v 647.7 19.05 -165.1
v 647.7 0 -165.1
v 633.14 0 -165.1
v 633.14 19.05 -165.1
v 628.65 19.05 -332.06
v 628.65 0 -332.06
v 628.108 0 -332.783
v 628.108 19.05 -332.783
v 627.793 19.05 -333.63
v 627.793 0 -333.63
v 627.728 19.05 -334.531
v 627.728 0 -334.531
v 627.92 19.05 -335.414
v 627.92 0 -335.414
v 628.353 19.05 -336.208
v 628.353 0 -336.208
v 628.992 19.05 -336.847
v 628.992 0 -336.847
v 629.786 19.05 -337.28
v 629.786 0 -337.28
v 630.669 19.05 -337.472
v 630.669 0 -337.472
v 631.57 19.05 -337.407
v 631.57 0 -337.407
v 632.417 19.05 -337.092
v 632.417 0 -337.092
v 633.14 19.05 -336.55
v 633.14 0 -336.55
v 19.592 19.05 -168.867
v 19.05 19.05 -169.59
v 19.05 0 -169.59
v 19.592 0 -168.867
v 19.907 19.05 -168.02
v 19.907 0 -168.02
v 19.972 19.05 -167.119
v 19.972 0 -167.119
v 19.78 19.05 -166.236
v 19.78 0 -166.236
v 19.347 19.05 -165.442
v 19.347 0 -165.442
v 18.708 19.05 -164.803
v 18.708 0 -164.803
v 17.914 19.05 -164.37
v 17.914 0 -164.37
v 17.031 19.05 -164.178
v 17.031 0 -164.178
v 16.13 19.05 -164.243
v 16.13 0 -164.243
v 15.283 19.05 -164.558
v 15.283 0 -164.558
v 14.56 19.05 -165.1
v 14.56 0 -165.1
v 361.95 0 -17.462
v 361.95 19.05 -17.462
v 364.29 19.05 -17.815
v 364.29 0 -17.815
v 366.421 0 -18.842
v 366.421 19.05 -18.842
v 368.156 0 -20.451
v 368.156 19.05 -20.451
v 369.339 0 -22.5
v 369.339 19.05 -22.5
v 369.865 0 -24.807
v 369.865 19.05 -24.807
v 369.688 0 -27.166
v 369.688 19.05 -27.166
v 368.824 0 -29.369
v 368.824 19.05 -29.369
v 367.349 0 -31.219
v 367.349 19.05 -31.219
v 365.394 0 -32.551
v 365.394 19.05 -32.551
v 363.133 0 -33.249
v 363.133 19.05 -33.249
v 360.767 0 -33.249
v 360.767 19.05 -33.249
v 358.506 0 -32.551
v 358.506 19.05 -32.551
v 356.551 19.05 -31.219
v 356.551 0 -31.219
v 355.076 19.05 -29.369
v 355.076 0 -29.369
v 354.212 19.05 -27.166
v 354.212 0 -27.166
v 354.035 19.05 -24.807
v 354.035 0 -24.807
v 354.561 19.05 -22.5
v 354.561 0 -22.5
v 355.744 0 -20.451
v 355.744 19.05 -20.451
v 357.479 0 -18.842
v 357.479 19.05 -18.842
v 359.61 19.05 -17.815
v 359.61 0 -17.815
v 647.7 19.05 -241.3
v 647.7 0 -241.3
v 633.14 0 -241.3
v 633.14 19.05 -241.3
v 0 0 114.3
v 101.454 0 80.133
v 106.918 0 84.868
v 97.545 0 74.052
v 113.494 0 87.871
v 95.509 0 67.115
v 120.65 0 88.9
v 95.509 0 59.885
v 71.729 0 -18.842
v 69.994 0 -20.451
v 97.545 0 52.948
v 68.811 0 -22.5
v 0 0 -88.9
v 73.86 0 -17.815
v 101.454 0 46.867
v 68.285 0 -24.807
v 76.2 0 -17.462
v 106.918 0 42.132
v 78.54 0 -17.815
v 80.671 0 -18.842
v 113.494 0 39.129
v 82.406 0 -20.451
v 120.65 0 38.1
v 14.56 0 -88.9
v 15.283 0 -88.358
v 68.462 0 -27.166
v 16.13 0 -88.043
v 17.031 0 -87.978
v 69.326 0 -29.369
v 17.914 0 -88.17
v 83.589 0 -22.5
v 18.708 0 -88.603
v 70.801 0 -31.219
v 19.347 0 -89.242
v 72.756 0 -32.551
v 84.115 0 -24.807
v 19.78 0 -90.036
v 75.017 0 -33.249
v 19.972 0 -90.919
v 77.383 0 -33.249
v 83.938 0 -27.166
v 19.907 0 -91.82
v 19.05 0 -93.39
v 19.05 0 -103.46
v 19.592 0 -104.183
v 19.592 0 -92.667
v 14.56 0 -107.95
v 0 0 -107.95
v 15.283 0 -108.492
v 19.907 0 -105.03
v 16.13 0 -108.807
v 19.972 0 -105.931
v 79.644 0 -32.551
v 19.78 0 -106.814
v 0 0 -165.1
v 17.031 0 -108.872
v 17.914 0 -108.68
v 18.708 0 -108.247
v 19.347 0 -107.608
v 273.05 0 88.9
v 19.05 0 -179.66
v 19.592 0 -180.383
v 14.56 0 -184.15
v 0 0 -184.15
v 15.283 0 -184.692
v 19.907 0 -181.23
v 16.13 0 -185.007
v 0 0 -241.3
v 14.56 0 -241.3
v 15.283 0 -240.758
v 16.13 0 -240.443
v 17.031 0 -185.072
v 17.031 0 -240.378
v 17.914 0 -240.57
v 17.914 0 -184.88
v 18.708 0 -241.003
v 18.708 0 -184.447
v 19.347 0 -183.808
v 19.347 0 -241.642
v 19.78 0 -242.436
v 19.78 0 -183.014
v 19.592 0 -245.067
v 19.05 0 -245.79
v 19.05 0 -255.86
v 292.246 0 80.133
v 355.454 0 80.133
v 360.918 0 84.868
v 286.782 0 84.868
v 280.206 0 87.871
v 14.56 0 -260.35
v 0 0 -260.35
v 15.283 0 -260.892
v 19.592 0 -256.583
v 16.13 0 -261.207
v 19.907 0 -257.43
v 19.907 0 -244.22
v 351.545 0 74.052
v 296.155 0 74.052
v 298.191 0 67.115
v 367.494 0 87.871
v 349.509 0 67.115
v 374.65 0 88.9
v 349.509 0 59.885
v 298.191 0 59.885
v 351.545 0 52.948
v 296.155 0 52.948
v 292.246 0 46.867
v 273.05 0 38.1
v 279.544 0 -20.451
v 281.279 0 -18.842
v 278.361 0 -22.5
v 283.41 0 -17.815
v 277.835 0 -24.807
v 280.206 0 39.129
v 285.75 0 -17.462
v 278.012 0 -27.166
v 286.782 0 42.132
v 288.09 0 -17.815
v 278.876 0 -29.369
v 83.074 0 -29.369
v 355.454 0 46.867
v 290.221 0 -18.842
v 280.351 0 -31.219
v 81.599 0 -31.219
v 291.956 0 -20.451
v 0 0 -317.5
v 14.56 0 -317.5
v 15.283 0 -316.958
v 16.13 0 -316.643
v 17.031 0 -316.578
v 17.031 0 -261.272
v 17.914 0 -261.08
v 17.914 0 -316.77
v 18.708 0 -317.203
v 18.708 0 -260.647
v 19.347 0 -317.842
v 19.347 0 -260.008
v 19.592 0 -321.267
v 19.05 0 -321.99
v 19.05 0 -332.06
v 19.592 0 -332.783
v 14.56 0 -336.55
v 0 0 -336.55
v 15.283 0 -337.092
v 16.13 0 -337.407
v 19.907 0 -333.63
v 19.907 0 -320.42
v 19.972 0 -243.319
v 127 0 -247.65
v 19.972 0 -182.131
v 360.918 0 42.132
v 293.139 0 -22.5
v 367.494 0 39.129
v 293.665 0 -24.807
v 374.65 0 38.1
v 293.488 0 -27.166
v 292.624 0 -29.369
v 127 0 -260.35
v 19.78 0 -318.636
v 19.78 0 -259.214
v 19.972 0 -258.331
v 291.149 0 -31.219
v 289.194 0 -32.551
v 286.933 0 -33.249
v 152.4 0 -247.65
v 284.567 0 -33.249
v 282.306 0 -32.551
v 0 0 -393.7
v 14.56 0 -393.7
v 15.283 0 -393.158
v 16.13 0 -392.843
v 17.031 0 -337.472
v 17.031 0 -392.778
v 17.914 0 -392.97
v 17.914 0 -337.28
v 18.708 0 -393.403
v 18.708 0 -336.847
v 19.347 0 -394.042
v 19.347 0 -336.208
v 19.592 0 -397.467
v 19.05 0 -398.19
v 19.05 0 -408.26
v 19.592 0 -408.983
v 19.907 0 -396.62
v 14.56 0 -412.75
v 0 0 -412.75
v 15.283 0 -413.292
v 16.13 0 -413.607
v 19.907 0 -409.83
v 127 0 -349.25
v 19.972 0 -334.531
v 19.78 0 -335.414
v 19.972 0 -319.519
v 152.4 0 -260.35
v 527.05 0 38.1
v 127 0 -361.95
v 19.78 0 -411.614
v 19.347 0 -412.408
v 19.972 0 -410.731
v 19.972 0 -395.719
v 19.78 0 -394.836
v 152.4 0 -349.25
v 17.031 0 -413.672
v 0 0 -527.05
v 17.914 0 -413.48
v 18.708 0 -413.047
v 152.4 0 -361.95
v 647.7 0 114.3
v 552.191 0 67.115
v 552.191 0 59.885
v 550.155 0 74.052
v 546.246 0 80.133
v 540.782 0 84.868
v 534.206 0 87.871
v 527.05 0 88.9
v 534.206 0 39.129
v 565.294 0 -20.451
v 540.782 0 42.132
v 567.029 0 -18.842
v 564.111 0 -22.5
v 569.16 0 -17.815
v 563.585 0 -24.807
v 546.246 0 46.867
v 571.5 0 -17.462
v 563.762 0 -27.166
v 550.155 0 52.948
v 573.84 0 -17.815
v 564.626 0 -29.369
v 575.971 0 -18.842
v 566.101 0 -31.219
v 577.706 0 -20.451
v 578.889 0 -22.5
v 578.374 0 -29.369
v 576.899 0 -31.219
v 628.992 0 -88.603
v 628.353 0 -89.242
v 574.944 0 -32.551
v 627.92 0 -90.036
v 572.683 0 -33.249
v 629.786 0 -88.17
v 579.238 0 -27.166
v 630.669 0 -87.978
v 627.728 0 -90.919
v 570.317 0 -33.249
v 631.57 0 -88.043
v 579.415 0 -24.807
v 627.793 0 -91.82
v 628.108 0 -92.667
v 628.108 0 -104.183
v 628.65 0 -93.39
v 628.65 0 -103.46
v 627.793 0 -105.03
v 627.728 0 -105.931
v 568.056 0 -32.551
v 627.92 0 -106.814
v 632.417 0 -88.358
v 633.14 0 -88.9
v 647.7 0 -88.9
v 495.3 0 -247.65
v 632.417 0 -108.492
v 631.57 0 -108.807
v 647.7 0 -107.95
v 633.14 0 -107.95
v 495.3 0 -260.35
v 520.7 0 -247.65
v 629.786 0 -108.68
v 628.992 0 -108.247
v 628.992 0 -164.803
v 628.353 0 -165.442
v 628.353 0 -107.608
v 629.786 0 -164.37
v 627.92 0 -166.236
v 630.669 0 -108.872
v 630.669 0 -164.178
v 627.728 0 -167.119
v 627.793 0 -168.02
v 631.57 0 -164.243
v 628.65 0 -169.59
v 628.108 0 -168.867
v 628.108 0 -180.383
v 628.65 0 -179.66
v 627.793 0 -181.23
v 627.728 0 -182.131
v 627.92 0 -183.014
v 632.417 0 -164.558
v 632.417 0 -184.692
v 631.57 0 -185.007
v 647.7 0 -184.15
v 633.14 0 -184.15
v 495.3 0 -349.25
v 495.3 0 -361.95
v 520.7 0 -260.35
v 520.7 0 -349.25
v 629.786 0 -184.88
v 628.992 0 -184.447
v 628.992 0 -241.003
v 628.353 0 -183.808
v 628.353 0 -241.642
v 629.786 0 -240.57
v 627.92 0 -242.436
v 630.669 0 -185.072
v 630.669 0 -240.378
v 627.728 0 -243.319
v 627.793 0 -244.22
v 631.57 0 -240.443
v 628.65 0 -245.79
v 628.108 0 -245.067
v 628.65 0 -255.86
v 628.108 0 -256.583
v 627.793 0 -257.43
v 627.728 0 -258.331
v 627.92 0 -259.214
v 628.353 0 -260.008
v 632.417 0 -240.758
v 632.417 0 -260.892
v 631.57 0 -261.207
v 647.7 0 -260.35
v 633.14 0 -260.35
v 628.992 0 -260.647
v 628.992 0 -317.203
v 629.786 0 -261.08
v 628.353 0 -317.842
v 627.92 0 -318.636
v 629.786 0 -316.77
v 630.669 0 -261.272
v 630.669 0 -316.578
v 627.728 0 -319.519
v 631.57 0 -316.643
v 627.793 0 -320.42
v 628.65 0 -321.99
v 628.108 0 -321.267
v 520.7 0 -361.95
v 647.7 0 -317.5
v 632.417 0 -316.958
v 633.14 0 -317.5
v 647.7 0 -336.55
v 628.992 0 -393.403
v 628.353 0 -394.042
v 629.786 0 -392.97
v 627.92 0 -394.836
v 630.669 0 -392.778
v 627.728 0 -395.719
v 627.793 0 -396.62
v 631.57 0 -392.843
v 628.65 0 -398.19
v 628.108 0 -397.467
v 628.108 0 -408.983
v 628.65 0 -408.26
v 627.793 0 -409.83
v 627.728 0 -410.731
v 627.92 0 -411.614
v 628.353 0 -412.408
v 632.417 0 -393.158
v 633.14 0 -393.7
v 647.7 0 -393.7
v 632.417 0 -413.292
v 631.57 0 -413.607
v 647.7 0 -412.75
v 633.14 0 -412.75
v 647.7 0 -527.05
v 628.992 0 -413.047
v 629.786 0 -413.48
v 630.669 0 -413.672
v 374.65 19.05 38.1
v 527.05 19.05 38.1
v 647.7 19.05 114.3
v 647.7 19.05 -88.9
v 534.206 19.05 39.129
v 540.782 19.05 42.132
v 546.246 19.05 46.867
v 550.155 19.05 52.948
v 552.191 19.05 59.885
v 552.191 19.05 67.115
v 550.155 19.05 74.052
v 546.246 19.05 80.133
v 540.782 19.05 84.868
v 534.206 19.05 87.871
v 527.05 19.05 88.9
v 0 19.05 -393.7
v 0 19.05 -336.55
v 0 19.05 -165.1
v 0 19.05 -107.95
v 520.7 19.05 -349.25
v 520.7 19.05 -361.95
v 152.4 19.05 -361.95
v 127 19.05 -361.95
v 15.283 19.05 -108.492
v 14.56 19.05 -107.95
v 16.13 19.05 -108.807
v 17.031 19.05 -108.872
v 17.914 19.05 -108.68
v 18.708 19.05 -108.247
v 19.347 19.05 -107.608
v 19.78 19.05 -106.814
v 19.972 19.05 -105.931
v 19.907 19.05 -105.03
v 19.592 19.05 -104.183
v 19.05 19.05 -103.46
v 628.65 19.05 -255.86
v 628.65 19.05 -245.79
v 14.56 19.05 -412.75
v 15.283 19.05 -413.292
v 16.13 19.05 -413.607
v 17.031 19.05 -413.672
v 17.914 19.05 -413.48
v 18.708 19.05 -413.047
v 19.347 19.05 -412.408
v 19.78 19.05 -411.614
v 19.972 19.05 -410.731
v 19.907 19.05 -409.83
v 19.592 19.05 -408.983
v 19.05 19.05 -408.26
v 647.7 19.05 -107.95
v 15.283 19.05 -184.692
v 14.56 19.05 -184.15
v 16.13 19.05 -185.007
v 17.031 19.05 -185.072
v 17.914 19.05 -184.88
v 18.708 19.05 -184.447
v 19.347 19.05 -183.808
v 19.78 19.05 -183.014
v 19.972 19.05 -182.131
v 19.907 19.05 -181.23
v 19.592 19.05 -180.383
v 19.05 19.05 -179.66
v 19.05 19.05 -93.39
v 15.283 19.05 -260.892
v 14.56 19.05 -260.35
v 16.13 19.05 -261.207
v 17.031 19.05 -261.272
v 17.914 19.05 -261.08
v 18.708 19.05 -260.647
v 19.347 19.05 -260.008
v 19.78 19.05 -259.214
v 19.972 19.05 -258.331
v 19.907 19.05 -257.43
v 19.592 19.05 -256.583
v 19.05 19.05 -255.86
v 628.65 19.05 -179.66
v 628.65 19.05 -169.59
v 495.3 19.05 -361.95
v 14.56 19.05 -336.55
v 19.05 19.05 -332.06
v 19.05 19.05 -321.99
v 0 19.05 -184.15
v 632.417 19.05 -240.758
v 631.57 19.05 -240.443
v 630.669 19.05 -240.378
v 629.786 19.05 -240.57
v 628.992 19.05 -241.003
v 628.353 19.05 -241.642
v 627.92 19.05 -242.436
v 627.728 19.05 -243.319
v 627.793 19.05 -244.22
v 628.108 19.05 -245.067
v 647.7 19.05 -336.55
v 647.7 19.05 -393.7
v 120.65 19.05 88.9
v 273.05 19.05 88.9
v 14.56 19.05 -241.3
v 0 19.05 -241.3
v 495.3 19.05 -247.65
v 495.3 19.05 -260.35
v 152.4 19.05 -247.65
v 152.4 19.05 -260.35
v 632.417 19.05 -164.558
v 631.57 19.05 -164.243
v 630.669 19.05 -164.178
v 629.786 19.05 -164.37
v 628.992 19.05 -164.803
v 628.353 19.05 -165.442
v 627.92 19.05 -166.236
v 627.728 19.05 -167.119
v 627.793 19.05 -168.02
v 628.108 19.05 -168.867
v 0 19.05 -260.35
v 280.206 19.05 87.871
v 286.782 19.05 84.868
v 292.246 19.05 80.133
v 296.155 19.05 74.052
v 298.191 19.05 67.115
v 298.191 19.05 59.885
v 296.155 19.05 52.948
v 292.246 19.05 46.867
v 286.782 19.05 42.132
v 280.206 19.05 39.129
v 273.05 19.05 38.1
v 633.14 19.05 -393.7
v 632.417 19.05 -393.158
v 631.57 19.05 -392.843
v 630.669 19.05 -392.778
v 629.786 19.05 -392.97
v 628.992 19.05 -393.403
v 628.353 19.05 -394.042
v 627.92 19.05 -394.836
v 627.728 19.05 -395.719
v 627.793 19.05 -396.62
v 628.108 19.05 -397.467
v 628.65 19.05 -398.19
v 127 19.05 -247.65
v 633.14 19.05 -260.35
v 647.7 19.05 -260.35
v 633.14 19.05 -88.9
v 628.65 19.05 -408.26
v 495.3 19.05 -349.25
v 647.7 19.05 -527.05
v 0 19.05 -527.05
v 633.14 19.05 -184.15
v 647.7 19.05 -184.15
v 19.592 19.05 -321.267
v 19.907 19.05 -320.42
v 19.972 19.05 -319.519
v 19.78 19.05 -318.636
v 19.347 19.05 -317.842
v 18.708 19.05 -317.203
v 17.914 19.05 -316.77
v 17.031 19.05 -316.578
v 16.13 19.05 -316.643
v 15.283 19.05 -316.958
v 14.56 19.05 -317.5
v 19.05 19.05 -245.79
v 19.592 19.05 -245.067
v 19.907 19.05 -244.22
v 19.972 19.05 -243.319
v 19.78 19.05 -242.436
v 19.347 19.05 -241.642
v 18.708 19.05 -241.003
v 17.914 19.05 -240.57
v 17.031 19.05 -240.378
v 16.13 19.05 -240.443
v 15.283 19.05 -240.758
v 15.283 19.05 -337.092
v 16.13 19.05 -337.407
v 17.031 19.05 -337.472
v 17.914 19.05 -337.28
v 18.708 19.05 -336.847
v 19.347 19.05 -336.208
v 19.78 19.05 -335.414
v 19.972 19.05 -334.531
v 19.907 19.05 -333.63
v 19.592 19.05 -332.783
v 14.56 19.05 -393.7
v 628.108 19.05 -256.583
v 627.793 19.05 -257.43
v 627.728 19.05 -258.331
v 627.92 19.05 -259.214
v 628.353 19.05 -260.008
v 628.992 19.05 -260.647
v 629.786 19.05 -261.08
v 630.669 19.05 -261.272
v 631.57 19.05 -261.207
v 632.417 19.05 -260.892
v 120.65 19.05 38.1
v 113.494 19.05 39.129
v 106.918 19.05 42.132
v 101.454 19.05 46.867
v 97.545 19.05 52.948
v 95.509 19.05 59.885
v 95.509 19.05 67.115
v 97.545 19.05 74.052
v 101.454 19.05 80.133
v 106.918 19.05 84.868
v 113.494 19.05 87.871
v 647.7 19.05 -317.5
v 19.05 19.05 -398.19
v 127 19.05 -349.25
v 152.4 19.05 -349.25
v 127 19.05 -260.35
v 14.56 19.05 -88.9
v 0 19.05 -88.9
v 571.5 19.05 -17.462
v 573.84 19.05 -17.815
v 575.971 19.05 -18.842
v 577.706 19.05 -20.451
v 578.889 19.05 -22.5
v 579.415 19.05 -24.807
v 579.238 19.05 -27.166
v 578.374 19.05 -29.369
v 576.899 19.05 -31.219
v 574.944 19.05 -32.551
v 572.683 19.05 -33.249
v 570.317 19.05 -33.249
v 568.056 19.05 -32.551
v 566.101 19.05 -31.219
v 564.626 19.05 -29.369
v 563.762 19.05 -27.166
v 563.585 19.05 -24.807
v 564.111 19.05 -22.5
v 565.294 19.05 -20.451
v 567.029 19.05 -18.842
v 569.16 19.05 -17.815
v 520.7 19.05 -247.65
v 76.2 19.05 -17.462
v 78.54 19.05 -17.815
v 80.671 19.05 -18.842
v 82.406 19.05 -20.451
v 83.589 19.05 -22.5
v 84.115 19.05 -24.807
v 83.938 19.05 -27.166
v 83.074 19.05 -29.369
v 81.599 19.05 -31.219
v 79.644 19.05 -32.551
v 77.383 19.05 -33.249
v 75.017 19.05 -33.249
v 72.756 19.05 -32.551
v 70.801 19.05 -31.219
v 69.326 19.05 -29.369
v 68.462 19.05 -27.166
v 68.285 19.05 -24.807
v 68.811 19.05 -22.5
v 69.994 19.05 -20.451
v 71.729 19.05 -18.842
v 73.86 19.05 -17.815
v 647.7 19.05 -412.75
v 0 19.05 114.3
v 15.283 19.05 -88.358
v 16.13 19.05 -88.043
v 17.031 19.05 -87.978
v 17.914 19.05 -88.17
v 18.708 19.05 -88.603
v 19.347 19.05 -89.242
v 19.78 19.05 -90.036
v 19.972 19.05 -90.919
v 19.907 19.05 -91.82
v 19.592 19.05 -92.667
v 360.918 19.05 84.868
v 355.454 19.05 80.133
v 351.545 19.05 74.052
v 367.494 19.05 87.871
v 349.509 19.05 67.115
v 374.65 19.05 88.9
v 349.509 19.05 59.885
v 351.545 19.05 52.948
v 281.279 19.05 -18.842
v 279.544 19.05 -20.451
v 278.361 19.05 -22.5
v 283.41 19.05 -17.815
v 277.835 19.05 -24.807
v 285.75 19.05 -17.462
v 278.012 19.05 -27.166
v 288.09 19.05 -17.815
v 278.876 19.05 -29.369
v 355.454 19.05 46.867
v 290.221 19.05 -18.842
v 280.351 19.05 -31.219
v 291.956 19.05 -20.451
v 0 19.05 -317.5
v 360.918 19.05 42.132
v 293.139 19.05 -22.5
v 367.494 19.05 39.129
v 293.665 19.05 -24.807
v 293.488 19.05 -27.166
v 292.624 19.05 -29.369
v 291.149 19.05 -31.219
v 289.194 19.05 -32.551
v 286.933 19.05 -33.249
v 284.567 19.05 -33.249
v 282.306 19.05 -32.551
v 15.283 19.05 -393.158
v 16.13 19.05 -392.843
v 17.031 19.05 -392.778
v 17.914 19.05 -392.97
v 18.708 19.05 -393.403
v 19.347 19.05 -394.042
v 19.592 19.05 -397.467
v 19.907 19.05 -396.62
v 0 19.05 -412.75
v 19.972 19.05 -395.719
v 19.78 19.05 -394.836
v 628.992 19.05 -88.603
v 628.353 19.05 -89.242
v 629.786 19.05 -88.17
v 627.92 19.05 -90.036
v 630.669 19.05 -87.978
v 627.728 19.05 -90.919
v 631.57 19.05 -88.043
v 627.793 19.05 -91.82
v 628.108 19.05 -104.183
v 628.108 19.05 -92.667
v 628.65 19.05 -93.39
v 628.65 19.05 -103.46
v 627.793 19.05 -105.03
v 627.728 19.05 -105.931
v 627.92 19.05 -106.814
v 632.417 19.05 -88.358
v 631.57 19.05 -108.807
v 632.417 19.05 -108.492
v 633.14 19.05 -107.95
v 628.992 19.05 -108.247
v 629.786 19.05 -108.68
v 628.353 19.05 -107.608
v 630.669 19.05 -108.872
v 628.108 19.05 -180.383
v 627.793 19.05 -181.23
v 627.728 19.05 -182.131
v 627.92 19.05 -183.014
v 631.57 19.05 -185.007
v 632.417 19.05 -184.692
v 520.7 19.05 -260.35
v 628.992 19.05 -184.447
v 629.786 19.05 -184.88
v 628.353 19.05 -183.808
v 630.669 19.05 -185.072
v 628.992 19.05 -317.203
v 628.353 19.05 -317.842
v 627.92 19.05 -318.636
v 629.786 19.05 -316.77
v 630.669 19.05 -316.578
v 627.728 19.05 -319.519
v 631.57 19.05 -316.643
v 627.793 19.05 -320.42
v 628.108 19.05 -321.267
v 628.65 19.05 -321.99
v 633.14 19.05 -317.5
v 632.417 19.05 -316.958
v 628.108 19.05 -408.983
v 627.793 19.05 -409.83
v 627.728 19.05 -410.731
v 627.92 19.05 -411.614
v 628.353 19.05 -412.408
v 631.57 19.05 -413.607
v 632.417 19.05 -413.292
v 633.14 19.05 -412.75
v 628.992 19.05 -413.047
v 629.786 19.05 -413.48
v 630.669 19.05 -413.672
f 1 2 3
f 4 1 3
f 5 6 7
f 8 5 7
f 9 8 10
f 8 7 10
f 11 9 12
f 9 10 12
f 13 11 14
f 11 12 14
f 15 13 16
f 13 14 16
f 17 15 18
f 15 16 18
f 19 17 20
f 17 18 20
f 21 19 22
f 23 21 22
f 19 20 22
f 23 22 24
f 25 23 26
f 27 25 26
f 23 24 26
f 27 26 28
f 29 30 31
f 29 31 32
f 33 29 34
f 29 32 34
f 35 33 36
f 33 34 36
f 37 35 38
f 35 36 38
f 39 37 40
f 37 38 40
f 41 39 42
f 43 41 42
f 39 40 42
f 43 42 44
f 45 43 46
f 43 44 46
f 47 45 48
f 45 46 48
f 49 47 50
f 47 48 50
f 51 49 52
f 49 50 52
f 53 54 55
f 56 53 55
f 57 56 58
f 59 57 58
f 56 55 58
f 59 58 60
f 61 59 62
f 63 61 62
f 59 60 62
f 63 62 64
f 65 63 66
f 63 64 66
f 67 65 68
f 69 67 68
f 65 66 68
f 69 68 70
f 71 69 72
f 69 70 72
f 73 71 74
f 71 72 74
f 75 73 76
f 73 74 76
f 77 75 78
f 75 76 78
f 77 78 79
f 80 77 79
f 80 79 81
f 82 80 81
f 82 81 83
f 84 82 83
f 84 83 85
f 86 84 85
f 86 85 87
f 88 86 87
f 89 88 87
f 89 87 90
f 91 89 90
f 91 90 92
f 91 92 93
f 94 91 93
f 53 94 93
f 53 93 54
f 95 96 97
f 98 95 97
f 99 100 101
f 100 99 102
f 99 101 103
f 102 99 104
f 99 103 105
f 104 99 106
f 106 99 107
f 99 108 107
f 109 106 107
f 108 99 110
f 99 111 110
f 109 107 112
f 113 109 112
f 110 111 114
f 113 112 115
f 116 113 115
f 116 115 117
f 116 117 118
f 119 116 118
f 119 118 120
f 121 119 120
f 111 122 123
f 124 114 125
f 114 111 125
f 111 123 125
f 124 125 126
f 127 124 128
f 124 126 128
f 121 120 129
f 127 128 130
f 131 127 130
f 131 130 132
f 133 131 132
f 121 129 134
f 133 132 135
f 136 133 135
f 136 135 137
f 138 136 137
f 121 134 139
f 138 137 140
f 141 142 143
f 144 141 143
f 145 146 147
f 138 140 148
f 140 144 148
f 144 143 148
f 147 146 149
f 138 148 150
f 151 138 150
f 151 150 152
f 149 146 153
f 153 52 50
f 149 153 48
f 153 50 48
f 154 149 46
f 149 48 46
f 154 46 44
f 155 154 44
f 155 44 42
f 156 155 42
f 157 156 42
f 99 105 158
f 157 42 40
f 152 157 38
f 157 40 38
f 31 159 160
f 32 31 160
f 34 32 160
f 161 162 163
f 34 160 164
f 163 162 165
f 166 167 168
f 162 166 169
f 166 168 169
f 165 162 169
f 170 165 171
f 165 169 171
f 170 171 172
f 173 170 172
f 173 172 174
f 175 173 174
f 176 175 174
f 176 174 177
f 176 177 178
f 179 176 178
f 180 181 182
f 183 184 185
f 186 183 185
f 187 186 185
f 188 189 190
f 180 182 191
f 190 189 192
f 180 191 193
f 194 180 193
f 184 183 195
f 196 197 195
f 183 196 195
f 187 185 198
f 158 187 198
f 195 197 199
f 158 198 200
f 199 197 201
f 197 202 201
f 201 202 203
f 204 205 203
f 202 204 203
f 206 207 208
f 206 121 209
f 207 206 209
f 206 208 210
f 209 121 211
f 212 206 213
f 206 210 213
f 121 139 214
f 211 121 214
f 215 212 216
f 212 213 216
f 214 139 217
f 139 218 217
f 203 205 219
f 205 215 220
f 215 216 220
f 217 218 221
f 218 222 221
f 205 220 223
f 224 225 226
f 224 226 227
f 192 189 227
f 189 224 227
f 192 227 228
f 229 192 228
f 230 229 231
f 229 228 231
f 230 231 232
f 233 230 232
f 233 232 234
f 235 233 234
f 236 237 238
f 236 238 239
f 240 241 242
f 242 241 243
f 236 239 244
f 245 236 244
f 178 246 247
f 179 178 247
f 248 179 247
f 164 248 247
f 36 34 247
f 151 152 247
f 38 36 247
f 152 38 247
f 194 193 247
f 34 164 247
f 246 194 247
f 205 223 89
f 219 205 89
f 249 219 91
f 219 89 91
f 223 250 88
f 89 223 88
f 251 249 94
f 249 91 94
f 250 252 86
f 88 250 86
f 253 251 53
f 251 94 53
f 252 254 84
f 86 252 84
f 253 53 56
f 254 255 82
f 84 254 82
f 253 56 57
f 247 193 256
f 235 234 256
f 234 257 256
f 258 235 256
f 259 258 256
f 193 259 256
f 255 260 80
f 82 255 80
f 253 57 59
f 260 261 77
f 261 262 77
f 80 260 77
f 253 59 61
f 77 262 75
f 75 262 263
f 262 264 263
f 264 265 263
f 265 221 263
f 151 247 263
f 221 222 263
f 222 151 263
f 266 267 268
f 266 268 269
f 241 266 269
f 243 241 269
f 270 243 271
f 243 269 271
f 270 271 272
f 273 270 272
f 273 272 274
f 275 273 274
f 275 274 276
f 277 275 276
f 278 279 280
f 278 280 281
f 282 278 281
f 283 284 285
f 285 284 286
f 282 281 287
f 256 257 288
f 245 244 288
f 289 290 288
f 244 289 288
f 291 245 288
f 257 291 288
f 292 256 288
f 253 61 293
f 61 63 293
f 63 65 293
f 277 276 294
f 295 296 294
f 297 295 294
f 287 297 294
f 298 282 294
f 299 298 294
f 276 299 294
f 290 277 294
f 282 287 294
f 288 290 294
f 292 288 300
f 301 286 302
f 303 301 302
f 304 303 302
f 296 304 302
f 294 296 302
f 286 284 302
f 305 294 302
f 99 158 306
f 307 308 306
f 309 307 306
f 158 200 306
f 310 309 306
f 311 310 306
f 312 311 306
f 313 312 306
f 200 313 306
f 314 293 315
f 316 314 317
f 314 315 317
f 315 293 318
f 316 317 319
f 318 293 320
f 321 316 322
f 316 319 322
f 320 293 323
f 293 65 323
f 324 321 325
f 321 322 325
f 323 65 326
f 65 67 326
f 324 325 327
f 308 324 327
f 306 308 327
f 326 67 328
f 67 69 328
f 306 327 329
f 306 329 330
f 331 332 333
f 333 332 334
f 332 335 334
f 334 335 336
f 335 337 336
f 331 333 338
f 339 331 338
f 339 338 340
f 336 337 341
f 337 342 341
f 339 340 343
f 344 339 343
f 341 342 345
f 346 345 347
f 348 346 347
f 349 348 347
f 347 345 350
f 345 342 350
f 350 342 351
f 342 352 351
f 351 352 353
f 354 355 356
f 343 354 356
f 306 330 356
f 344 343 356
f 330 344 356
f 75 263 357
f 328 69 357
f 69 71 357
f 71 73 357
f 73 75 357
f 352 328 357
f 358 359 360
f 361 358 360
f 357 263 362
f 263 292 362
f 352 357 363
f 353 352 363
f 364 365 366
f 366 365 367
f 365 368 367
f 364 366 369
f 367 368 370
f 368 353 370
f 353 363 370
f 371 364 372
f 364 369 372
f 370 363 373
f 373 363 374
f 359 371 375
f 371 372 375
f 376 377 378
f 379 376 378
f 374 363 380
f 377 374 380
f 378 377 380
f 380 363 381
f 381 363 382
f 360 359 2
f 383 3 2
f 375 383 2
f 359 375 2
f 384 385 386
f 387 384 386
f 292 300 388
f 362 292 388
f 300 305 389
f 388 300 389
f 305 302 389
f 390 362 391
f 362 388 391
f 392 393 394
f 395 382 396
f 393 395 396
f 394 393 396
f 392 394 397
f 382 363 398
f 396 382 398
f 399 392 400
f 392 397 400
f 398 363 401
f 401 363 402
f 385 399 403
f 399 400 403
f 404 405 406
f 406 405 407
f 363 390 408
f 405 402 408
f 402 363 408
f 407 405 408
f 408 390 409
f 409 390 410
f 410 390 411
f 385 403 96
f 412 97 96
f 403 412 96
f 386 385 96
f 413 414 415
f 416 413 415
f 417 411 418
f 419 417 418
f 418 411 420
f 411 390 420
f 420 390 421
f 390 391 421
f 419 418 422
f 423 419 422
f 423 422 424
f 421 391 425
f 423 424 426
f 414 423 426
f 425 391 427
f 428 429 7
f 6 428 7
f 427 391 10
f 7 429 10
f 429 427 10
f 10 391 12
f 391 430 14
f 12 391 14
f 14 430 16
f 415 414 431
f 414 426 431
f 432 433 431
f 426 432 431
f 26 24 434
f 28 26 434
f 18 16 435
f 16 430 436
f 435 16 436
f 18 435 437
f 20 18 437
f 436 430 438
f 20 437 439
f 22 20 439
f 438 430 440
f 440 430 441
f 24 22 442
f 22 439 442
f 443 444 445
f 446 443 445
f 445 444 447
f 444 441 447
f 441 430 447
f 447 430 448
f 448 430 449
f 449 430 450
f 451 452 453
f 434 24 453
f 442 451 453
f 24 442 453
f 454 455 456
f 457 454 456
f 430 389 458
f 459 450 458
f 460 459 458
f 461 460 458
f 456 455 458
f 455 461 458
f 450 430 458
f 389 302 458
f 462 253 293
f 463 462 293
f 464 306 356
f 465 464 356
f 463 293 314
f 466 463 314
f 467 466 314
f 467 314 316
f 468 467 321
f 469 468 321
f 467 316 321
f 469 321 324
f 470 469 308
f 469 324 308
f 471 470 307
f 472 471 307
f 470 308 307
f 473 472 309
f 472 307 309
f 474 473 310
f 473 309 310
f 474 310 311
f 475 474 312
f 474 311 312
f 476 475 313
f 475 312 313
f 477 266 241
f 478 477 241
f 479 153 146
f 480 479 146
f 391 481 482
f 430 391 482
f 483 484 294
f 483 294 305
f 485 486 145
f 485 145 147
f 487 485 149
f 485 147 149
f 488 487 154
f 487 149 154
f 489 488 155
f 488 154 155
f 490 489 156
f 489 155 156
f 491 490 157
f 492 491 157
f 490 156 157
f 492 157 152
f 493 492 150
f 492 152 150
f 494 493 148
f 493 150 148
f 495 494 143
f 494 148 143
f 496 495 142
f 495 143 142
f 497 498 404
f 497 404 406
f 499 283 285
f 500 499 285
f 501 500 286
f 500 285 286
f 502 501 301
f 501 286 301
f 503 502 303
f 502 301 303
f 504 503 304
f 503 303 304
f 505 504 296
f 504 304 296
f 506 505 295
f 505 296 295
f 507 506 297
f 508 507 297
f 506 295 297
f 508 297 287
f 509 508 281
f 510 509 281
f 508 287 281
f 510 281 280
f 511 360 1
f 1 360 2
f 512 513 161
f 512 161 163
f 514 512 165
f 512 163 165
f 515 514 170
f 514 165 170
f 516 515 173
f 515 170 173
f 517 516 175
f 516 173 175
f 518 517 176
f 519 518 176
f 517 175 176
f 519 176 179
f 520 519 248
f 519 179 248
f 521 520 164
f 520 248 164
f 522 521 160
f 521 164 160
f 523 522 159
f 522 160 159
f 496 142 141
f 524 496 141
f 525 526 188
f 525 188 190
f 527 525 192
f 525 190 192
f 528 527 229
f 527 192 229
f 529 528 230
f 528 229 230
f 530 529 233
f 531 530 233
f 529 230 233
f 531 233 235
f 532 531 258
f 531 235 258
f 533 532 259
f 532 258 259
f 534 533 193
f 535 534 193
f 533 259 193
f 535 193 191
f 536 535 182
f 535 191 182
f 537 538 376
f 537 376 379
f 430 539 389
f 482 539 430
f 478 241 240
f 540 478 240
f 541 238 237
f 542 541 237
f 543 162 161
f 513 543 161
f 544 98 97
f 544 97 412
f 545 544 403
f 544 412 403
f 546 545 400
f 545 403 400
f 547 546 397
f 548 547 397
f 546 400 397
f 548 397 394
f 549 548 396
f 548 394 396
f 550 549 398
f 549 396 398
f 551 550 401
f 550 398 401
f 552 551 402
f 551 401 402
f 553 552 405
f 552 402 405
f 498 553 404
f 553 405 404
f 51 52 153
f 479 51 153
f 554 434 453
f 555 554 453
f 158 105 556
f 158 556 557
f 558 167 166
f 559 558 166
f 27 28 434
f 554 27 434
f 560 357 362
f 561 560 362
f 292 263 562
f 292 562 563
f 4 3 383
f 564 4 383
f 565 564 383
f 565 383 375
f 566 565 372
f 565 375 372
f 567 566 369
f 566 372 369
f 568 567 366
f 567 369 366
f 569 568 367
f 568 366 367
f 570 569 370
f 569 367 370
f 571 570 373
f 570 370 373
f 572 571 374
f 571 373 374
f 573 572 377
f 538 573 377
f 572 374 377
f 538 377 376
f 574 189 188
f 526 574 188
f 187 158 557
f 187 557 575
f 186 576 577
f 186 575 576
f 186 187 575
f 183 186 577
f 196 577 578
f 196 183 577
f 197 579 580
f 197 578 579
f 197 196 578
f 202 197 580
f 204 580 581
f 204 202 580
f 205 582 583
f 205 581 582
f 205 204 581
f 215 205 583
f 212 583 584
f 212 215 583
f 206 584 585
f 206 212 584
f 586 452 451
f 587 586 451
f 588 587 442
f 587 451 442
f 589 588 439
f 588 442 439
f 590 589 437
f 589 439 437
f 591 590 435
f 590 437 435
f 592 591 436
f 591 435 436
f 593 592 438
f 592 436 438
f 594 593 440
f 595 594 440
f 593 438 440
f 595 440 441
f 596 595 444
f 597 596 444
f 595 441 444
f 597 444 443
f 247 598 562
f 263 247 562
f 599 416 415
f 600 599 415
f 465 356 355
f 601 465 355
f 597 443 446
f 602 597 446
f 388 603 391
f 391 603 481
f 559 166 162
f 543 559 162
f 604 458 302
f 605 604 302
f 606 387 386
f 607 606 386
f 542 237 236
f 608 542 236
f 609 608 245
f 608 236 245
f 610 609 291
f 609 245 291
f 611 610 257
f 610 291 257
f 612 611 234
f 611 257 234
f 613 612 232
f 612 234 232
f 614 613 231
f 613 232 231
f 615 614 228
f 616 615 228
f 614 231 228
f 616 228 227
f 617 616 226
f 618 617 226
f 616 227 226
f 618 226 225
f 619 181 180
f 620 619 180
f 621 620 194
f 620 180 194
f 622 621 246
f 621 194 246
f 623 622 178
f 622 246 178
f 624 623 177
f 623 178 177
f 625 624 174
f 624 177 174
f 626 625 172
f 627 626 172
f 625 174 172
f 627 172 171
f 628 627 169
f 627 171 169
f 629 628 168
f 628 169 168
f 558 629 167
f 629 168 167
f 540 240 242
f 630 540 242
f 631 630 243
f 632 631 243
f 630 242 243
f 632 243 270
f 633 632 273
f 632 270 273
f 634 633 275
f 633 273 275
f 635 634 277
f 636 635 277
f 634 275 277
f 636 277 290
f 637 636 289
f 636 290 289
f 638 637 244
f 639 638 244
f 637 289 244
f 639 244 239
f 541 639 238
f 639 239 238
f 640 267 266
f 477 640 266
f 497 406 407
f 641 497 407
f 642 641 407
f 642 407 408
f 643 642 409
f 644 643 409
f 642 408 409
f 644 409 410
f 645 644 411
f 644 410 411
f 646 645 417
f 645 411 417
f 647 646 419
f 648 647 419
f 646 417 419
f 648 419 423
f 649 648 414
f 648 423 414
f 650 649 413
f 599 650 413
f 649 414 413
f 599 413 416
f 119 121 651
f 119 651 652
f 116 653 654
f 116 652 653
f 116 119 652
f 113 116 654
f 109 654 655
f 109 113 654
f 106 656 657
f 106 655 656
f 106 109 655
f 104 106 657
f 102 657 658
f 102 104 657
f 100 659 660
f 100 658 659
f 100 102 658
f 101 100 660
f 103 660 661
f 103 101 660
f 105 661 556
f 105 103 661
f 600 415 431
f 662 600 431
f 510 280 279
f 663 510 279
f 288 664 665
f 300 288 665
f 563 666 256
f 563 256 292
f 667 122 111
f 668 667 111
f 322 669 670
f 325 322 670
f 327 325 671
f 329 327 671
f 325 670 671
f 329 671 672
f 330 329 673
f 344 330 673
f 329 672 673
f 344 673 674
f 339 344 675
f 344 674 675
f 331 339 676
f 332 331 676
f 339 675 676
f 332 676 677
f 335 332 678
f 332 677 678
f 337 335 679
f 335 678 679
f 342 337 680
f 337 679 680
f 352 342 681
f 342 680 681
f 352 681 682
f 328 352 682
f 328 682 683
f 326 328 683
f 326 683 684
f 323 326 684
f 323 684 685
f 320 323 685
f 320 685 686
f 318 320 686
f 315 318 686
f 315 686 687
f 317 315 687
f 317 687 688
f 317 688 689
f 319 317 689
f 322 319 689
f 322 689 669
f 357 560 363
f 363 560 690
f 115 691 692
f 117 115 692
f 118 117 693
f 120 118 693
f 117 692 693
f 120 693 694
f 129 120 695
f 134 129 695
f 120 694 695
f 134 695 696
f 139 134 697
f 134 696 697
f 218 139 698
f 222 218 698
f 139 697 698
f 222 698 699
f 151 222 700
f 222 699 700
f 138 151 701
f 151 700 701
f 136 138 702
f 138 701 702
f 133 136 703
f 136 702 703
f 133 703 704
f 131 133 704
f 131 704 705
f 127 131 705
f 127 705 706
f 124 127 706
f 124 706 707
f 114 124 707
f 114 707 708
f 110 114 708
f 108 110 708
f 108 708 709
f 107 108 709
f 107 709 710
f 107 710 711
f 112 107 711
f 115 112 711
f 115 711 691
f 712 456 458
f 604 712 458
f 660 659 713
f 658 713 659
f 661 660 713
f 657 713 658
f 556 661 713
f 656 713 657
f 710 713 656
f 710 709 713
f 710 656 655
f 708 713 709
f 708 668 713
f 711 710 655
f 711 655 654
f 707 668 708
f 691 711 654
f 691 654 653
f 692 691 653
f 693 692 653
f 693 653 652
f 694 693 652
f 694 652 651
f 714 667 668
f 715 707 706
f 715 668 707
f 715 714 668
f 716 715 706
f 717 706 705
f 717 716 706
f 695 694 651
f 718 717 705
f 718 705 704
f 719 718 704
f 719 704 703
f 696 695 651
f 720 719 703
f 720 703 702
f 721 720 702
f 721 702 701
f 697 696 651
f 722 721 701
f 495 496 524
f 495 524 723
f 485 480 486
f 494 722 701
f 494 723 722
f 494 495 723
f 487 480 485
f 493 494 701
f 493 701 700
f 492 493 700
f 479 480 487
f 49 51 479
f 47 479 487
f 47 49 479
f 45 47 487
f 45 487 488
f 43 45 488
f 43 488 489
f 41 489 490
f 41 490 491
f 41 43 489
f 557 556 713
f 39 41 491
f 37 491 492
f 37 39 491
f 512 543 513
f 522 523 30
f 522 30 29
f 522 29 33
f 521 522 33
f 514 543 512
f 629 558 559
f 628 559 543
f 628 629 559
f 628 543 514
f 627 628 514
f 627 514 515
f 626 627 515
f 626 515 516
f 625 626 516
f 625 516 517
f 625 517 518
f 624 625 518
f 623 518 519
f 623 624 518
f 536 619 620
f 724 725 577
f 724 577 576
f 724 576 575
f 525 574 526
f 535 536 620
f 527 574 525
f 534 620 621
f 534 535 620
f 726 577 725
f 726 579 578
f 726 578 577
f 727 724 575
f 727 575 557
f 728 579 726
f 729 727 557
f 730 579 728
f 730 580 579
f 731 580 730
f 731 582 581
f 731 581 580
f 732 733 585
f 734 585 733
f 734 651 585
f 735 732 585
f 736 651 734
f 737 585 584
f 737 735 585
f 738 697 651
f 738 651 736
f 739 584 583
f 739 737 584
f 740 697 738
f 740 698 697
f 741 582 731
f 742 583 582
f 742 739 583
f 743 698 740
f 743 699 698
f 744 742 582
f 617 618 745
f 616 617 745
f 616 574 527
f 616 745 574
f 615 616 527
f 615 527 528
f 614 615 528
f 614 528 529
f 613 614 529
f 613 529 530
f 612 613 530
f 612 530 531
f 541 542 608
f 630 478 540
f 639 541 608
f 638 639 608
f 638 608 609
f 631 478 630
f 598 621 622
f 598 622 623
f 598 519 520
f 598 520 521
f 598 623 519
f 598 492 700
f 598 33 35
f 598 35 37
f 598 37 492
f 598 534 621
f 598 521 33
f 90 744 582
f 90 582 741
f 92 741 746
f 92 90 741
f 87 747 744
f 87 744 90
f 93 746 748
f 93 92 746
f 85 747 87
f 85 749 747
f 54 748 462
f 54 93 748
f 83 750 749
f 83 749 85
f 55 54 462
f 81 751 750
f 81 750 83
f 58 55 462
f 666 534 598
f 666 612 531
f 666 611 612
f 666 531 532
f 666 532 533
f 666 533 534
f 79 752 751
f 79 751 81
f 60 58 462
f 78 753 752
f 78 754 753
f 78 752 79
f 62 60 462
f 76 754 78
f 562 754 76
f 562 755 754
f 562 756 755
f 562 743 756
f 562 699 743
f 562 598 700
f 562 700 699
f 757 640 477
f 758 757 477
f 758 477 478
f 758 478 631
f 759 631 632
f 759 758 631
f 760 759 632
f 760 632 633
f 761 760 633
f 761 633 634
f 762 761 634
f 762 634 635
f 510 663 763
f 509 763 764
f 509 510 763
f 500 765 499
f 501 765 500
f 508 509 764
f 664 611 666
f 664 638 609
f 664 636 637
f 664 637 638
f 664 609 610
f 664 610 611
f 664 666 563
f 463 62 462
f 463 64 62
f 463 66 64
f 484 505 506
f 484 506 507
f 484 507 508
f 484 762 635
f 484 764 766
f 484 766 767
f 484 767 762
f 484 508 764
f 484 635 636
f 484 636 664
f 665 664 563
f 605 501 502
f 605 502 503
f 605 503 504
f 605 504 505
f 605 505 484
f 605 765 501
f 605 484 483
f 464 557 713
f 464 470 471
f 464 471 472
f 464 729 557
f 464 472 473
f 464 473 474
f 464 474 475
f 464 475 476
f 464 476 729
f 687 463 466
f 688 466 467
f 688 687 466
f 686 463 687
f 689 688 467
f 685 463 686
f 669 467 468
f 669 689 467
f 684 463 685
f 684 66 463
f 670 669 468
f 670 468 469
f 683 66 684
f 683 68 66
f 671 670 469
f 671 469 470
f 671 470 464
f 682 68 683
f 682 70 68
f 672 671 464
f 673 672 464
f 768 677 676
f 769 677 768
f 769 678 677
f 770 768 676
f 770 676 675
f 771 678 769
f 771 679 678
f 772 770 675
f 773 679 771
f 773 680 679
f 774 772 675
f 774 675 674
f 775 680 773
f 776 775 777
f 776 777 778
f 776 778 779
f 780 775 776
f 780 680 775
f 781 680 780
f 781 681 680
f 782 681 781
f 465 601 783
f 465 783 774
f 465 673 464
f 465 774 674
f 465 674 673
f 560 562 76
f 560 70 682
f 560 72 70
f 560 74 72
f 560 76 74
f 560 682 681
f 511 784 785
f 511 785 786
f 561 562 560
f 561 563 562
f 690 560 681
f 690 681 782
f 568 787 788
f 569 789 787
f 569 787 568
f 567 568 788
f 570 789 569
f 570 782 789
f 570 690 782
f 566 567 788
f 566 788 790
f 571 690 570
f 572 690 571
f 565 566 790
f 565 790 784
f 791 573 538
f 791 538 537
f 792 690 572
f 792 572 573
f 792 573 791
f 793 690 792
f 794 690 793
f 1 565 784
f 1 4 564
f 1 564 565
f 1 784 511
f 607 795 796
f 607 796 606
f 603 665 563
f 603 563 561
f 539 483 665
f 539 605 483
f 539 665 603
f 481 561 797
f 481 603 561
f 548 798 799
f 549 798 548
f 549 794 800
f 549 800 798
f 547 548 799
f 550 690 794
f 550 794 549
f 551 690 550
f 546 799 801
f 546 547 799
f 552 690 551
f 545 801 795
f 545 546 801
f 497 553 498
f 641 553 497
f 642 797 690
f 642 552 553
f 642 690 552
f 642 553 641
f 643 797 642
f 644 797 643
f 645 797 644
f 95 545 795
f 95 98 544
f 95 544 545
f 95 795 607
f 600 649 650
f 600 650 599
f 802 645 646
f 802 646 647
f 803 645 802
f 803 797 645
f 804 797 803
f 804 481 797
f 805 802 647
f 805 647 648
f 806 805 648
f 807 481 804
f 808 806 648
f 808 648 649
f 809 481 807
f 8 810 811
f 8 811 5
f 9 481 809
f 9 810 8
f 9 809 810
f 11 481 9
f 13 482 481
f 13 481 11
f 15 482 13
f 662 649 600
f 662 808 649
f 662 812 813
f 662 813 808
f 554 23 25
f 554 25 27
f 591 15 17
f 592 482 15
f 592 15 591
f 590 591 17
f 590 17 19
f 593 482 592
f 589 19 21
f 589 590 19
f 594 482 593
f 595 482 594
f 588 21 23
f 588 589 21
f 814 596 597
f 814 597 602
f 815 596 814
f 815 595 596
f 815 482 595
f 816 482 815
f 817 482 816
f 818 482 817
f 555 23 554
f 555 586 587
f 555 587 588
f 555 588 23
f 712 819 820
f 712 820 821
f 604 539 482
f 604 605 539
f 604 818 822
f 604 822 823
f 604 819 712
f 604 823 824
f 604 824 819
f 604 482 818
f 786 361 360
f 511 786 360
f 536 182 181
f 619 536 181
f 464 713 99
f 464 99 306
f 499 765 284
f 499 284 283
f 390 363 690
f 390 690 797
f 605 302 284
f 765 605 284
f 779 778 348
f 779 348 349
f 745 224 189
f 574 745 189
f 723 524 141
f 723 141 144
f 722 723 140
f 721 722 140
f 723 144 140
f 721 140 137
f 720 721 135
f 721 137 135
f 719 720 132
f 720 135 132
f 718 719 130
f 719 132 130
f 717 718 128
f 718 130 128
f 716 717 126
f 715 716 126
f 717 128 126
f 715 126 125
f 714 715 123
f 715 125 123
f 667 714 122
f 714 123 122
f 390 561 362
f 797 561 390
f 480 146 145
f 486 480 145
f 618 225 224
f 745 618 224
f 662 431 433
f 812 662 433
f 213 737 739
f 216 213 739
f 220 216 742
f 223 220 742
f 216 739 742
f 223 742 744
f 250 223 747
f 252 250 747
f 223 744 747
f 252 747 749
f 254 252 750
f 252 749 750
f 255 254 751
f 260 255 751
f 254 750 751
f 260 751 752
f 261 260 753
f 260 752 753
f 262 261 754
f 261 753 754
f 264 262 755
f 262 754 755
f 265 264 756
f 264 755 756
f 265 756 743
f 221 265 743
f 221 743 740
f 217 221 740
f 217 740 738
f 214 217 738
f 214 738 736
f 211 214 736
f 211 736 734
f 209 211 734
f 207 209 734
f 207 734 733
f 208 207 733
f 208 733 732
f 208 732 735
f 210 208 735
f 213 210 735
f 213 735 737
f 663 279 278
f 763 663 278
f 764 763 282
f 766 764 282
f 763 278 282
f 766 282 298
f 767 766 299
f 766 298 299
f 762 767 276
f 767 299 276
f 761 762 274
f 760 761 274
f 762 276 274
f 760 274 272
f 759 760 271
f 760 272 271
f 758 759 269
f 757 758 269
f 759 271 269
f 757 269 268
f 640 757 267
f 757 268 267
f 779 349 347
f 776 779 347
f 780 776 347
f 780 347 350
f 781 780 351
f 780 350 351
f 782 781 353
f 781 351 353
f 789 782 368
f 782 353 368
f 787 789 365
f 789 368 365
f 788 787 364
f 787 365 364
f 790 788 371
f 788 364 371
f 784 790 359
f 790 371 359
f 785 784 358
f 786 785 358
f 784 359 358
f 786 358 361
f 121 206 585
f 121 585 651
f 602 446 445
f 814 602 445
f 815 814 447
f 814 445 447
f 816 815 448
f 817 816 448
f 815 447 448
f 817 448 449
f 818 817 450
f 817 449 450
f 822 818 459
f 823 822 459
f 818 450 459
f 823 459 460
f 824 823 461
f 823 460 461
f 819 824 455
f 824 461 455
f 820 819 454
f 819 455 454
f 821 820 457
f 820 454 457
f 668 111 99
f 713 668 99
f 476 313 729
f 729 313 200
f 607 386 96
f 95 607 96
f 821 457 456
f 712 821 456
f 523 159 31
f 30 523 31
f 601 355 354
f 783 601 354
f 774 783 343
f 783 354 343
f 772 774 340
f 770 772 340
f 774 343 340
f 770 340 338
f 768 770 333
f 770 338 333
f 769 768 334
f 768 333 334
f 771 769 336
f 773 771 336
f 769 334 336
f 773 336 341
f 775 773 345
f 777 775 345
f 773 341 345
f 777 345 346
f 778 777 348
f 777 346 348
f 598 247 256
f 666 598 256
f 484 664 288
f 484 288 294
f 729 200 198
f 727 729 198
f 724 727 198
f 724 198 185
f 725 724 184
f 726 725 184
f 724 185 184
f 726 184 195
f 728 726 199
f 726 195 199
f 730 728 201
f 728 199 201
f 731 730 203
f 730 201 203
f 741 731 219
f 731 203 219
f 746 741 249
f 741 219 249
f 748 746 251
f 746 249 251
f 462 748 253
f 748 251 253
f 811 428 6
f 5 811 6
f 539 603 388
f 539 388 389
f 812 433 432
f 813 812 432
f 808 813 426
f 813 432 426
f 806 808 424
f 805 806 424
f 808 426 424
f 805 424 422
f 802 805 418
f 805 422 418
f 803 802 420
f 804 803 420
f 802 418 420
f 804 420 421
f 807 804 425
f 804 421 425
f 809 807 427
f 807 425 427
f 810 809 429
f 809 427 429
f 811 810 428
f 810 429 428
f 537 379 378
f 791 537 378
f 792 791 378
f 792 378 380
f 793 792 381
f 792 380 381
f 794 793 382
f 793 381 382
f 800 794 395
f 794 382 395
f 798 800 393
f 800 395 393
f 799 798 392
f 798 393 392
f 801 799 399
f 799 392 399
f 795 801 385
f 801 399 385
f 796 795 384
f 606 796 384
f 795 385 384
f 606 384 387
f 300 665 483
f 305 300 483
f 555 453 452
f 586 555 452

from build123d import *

# Parameters (mm, degrees)
BOSS_EXTRUDE1_DEPTH     = 19.05
SKETCH2_R               = 7.9375
CUT_EXTRUDE1_DEPTH      = 836.260375572
SKETCH3_W               = 25.4
SKETCH3_H               = 12.7
CUT_EXTRUDE2_DEPTH      = 836.260375572
SKETCH4_W               = 444.5
SKETCH4_H               = 114.3
BOSS_EXTRUDE2_DEPTH     = 19.05
CUT_EXTRUDE3_DEPTH      = 836.260375572
CUT_EXTRUDE3_DEPTH_BACK = 836.260375572


with BuildPart() as part:
    # Sketch1 → Boss-Extrude1 (new body)
    with BuildSketch(Plane(origin=(0, 0, 0), x_dir=(1, 0, 0), z_dir=(0, 1, 0))):
        with BuildLine():
            Line((0, 88.9), (0, -114.3))
            Line((0, -114.3), (101.6, -114.3))
            Line((101.6, -114.3), (101.6, 0))
            Line((101.6, 0), (546.1, 0))
            Line((546.1, 0), (546.1, -114.3))
            Line((546.1, -114.3), (647.7, -114.3))
            Line((647.7, -114.3), (647.7, 88.9))
            Line((647.7, 88.9), (633.140128061, 88.9))
            ThreePointArc((633.140128061, 88.9), (628.65, 88.9), (628.65, 93.390128061))
            Line((628.65, 93.390128061), (628.65, 103.459871939))
            ThreePointArc((628.65, 103.459871939), (628.65, 107.95), (633.140128061, 107.95))
            Line((633.140128061, 107.95), (647.7, 107.95))
            Line((647.7, 107.95), (647.7, 165.1))
            Line((647.7, 165.1), (633.140128061, 165.1))
            ThreePointArc((633.140128061, 165.1), (628.65, 165.1), (628.65, 169.590128061))
            Line((628.65, 169.590128061), (628.65, 179.659871939))
            ThreePointArc((628.65, 179.659871939), (628.65, 184.15), (633.140128061, 184.15))
            Line((633.140128061, 184.15), (647.7, 184.15))
            Line((647.7, 184.15), (647.7, 241.3))
            Line((647.7, 241.3), (633.140128061, 241.3))
            ThreePointArc((633.140128061, 241.3), (628.65, 241.3), (628.65, 245.790128061))
            Line((628.65, 245.790128061), (628.65, 255.859871939))
            ThreePointArc((628.65, 255.859871939), (628.65, 260.35), (633.140128061, 260.35))
            Line((633.140128061, 260.35), (647.7, 260.35))
            Line((647.7, 260.35), (647.7, 317.5))
            Line((647.7, 317.5), (633.140128061, 317.5))
            ThreePointArc((633.140128061, 317.5), (628.65, 317.5), (628.65, 321.990128061))
            Line((628.65, 321.990128061), (628.65, 332.059871939))
            ThreePointArc((628.65, 332.059871939), (628.65, 336.55), (633.140128061, 336.55))
            Line((633.140128061, 336.55), (647.7, 336.55))
            Line((647.7, 336.55), (647.7, 393.7))
            Line((647.7, 393.7), (633.140128061, 393.7))
            ThreePointArc((633.140128061, 393.7), (628.65, 393.7), (628.65, 398.190128061))
            Line((628.65, 398.190128061), (628.65, 408.259871939))
            ThreePointArc((628.65, 408.259871939), (628.65, 412.75), (633.140128061, 412.75))
            Line((633.140128061, 412.75), (647.7, 412.75))
            Line((647.7, 412.75), (647.7, 527.05))
            Line((647.7, 527.05), (546.1, 527.05))
            Line((546.1, 527.05), (546.1, 412.75))
            Line((546.1, 412.75), (101.6, 412.75))
            Line((101.6, 412.75), (101.6, 527.05))
            Line((101.6, 527.05), (0, 527.05))
            Line((0, 527.05), (0, 412.75))
            Line((0, 412.75), (14.559871939, 412.75))
            ThreePointArc((14.559871939, 412.75), (19.05, 412.75), (19.05, 408.259871939))
            Line((19.05, 408.259871939), (19.05, 398.190128061))
            ThreePointArc((19.05, 398.190128061), (19.05, 393.7), (14.559871939, 393.7))
            Line((14.559871939, 393.7), (0, 393.7))
            Line((0, 393.7), (0, 336.55))
            Line((0, 336.55), (14.559871939, 336.55))
            ThreePointArc((14.559871939, 336.55), (19.05, 336.55), (19.05, 332.059871939))
            Line((19.05, 332.059871939), (19.05, 321.990128061))
            ThreePointArc((19.05, 321.990128061), (19.05, 317.5), (14.559871939, 317.5))
            Line((14.559871939, 317.5), (0, 317.5))
            Line((0, 317.5), (0, 260.35))
            Line((0, 260.35), (14.559871939, 260.35))
            ThreePointArc((14.559871939, 260.35), (19.05, 260.35), (19.05, 255.859871939))
            Line((19.05, 255.859871939), (19.05, 245.790128061))
            ThreePointArc((19.05, 245.790128061), (19.05, 241.3), (14.559871939, 241.3))
            Line((14.559871939, 241.3), (0, 241.3))
            Line((0, 241.3), (0, 184.15))
            Line((0, 184.15), (14.559871939, 184.15))
            ThreePointArc((14.559871939, 184.15), (19.05, 184.15), (19.05, 179.659871939))
            Line((19.05, 179.659871939), (19.05, 169.590128061))
            ThreePointArc((19.05, 169.590128061), (19.05, 165.1), (14.559871939, 165.1))
            Line((14.559871939, 165.1), (0, 165.1))
            Line((0, 165.1), (0, 107.95))
            Line((0, 107.95), (14.559871939, 107.95))
            ThreePointArc((14.559871939, 107.95), (19.05, 107.95), (19.05, 103.459871939))
            Line((19.05, 103.459871939), (19.05, 93.390128061))
            ThreePointArc((19.05, 93.390128061), (19.05, 88.9), (14.559871939, 88.9))
            Line((14.559871939, 88.9), (0, 88.9))
        make_face()
    extrude(amount=BOSS_EXTRUDE1_DEPTH)

    # Sketch2 → Cut-Extrude1 (cut, through all)
    with BuildSketch(Plane(origin=(0, 19.05, 0), x_dir=(1, 0, 0), z_dir=(0, 1, 0))):
        with Locations(Location((361.95, 25.4, 0), (0, 0, 270))):
            Circle(SKETCH2_R)
        with Locations(Location((285.75, 25.4, 0), (0, 0, 270))):
            Circle(SKETCH2_R)
        with Locations(Location((571.5, 25.4, 0), (0, 0, 270))):
            Circle(SKETCH2_R)
        with Locations(Location((76.2, 25.4, 0), (0, 0, 270))):
            Circle(SKETCH2_R)
    extrude(amount=-CUT_EXTRUDE1_DEPTH, mode=Mode.SUBTRACT)

    # Sketch3 → Cut-Extrude2 (cut, through all)
    with BuildSketch(Plane(origin=(0, 19.05, 0), x_dir=(1, 0, 0), z_dir=(0, 1, 0))):
        with Locations((508, 355.6)):
            Rectangle(SKETCH3_W, SKETCH3_H)
        with Locations((508, 254)):
            Rectangle(SKETCH3_W, SKETCH3_H)
        with Locations((139.7, 254)):
            Rectangle(SKETCH3_W, SKETCH3_H)
        with Locations((139.7, 355.6)):
            Rectangle(SKETCH3_W, SKETCH3_H)
    extrude(amount=-CUT_EXTRUDE2_DEPTH, mode=Mode.SUBTRACT)

    # Sketch4 → Boss-Extrude2 (add)
    with BuildSketch(Plane(origin=(0, 19.05, 0), x_dir=(1, 0, 0), z_dir=(0, 1, 0))):
        with Locations((323.85, -57.15)):
            Rectangle(SKETCH4_W, SKETCH4_H)
        with Locations((323.85, 469.9)):
            Rectangle(SKETCH4_W, SKETCH4_H)
    extrude(amount=-BOSS_EXTRUDE2_DEPTH)

    # Sketch5 → Cut-Extrude3 (cut, two sides: drawn at the far end of the back side and taken through both)
    with BuildSketch(Plane(origin=(0, 19.05, 0), x_dir=(1, 0, 0), z_dir=(0, 1, 0)).offset(-CUT_EXTRUDE3_DEPTH_BACK)):
        with BuildLine():
            Line((374.65, -38.1), (527.05, -38.1))
            ThreePointArc((527.05, -38.1), (552.45, -63.5), (527.05, -88.9))
            Line((527.05, -88.9), (374.65, -88.9))
            ThreePointArc((374.65, -88.9), (349.25, -63.5), (374.65, -38.1))
        make_face()
        with BuildLine():
            Line((273.05, -38.1), (120.65, -38.1))
            ThreePointArc((120.65, -38.1), (95.25, -63.5), (120.65, -88.9))
            Line((120.65, -88.9), (273.05, -88.9))
            ThreePointArc((273.05, -88.9), (298.45, -63.5), (273.05, -38.1))
        make_face()
    extrude(amount=CUT_EXTRUDE3_DEPTH + CUT_EXTRUDE3_DEPTH_BACK, mode=Mode.SUBTRACT)


solid = part.part
